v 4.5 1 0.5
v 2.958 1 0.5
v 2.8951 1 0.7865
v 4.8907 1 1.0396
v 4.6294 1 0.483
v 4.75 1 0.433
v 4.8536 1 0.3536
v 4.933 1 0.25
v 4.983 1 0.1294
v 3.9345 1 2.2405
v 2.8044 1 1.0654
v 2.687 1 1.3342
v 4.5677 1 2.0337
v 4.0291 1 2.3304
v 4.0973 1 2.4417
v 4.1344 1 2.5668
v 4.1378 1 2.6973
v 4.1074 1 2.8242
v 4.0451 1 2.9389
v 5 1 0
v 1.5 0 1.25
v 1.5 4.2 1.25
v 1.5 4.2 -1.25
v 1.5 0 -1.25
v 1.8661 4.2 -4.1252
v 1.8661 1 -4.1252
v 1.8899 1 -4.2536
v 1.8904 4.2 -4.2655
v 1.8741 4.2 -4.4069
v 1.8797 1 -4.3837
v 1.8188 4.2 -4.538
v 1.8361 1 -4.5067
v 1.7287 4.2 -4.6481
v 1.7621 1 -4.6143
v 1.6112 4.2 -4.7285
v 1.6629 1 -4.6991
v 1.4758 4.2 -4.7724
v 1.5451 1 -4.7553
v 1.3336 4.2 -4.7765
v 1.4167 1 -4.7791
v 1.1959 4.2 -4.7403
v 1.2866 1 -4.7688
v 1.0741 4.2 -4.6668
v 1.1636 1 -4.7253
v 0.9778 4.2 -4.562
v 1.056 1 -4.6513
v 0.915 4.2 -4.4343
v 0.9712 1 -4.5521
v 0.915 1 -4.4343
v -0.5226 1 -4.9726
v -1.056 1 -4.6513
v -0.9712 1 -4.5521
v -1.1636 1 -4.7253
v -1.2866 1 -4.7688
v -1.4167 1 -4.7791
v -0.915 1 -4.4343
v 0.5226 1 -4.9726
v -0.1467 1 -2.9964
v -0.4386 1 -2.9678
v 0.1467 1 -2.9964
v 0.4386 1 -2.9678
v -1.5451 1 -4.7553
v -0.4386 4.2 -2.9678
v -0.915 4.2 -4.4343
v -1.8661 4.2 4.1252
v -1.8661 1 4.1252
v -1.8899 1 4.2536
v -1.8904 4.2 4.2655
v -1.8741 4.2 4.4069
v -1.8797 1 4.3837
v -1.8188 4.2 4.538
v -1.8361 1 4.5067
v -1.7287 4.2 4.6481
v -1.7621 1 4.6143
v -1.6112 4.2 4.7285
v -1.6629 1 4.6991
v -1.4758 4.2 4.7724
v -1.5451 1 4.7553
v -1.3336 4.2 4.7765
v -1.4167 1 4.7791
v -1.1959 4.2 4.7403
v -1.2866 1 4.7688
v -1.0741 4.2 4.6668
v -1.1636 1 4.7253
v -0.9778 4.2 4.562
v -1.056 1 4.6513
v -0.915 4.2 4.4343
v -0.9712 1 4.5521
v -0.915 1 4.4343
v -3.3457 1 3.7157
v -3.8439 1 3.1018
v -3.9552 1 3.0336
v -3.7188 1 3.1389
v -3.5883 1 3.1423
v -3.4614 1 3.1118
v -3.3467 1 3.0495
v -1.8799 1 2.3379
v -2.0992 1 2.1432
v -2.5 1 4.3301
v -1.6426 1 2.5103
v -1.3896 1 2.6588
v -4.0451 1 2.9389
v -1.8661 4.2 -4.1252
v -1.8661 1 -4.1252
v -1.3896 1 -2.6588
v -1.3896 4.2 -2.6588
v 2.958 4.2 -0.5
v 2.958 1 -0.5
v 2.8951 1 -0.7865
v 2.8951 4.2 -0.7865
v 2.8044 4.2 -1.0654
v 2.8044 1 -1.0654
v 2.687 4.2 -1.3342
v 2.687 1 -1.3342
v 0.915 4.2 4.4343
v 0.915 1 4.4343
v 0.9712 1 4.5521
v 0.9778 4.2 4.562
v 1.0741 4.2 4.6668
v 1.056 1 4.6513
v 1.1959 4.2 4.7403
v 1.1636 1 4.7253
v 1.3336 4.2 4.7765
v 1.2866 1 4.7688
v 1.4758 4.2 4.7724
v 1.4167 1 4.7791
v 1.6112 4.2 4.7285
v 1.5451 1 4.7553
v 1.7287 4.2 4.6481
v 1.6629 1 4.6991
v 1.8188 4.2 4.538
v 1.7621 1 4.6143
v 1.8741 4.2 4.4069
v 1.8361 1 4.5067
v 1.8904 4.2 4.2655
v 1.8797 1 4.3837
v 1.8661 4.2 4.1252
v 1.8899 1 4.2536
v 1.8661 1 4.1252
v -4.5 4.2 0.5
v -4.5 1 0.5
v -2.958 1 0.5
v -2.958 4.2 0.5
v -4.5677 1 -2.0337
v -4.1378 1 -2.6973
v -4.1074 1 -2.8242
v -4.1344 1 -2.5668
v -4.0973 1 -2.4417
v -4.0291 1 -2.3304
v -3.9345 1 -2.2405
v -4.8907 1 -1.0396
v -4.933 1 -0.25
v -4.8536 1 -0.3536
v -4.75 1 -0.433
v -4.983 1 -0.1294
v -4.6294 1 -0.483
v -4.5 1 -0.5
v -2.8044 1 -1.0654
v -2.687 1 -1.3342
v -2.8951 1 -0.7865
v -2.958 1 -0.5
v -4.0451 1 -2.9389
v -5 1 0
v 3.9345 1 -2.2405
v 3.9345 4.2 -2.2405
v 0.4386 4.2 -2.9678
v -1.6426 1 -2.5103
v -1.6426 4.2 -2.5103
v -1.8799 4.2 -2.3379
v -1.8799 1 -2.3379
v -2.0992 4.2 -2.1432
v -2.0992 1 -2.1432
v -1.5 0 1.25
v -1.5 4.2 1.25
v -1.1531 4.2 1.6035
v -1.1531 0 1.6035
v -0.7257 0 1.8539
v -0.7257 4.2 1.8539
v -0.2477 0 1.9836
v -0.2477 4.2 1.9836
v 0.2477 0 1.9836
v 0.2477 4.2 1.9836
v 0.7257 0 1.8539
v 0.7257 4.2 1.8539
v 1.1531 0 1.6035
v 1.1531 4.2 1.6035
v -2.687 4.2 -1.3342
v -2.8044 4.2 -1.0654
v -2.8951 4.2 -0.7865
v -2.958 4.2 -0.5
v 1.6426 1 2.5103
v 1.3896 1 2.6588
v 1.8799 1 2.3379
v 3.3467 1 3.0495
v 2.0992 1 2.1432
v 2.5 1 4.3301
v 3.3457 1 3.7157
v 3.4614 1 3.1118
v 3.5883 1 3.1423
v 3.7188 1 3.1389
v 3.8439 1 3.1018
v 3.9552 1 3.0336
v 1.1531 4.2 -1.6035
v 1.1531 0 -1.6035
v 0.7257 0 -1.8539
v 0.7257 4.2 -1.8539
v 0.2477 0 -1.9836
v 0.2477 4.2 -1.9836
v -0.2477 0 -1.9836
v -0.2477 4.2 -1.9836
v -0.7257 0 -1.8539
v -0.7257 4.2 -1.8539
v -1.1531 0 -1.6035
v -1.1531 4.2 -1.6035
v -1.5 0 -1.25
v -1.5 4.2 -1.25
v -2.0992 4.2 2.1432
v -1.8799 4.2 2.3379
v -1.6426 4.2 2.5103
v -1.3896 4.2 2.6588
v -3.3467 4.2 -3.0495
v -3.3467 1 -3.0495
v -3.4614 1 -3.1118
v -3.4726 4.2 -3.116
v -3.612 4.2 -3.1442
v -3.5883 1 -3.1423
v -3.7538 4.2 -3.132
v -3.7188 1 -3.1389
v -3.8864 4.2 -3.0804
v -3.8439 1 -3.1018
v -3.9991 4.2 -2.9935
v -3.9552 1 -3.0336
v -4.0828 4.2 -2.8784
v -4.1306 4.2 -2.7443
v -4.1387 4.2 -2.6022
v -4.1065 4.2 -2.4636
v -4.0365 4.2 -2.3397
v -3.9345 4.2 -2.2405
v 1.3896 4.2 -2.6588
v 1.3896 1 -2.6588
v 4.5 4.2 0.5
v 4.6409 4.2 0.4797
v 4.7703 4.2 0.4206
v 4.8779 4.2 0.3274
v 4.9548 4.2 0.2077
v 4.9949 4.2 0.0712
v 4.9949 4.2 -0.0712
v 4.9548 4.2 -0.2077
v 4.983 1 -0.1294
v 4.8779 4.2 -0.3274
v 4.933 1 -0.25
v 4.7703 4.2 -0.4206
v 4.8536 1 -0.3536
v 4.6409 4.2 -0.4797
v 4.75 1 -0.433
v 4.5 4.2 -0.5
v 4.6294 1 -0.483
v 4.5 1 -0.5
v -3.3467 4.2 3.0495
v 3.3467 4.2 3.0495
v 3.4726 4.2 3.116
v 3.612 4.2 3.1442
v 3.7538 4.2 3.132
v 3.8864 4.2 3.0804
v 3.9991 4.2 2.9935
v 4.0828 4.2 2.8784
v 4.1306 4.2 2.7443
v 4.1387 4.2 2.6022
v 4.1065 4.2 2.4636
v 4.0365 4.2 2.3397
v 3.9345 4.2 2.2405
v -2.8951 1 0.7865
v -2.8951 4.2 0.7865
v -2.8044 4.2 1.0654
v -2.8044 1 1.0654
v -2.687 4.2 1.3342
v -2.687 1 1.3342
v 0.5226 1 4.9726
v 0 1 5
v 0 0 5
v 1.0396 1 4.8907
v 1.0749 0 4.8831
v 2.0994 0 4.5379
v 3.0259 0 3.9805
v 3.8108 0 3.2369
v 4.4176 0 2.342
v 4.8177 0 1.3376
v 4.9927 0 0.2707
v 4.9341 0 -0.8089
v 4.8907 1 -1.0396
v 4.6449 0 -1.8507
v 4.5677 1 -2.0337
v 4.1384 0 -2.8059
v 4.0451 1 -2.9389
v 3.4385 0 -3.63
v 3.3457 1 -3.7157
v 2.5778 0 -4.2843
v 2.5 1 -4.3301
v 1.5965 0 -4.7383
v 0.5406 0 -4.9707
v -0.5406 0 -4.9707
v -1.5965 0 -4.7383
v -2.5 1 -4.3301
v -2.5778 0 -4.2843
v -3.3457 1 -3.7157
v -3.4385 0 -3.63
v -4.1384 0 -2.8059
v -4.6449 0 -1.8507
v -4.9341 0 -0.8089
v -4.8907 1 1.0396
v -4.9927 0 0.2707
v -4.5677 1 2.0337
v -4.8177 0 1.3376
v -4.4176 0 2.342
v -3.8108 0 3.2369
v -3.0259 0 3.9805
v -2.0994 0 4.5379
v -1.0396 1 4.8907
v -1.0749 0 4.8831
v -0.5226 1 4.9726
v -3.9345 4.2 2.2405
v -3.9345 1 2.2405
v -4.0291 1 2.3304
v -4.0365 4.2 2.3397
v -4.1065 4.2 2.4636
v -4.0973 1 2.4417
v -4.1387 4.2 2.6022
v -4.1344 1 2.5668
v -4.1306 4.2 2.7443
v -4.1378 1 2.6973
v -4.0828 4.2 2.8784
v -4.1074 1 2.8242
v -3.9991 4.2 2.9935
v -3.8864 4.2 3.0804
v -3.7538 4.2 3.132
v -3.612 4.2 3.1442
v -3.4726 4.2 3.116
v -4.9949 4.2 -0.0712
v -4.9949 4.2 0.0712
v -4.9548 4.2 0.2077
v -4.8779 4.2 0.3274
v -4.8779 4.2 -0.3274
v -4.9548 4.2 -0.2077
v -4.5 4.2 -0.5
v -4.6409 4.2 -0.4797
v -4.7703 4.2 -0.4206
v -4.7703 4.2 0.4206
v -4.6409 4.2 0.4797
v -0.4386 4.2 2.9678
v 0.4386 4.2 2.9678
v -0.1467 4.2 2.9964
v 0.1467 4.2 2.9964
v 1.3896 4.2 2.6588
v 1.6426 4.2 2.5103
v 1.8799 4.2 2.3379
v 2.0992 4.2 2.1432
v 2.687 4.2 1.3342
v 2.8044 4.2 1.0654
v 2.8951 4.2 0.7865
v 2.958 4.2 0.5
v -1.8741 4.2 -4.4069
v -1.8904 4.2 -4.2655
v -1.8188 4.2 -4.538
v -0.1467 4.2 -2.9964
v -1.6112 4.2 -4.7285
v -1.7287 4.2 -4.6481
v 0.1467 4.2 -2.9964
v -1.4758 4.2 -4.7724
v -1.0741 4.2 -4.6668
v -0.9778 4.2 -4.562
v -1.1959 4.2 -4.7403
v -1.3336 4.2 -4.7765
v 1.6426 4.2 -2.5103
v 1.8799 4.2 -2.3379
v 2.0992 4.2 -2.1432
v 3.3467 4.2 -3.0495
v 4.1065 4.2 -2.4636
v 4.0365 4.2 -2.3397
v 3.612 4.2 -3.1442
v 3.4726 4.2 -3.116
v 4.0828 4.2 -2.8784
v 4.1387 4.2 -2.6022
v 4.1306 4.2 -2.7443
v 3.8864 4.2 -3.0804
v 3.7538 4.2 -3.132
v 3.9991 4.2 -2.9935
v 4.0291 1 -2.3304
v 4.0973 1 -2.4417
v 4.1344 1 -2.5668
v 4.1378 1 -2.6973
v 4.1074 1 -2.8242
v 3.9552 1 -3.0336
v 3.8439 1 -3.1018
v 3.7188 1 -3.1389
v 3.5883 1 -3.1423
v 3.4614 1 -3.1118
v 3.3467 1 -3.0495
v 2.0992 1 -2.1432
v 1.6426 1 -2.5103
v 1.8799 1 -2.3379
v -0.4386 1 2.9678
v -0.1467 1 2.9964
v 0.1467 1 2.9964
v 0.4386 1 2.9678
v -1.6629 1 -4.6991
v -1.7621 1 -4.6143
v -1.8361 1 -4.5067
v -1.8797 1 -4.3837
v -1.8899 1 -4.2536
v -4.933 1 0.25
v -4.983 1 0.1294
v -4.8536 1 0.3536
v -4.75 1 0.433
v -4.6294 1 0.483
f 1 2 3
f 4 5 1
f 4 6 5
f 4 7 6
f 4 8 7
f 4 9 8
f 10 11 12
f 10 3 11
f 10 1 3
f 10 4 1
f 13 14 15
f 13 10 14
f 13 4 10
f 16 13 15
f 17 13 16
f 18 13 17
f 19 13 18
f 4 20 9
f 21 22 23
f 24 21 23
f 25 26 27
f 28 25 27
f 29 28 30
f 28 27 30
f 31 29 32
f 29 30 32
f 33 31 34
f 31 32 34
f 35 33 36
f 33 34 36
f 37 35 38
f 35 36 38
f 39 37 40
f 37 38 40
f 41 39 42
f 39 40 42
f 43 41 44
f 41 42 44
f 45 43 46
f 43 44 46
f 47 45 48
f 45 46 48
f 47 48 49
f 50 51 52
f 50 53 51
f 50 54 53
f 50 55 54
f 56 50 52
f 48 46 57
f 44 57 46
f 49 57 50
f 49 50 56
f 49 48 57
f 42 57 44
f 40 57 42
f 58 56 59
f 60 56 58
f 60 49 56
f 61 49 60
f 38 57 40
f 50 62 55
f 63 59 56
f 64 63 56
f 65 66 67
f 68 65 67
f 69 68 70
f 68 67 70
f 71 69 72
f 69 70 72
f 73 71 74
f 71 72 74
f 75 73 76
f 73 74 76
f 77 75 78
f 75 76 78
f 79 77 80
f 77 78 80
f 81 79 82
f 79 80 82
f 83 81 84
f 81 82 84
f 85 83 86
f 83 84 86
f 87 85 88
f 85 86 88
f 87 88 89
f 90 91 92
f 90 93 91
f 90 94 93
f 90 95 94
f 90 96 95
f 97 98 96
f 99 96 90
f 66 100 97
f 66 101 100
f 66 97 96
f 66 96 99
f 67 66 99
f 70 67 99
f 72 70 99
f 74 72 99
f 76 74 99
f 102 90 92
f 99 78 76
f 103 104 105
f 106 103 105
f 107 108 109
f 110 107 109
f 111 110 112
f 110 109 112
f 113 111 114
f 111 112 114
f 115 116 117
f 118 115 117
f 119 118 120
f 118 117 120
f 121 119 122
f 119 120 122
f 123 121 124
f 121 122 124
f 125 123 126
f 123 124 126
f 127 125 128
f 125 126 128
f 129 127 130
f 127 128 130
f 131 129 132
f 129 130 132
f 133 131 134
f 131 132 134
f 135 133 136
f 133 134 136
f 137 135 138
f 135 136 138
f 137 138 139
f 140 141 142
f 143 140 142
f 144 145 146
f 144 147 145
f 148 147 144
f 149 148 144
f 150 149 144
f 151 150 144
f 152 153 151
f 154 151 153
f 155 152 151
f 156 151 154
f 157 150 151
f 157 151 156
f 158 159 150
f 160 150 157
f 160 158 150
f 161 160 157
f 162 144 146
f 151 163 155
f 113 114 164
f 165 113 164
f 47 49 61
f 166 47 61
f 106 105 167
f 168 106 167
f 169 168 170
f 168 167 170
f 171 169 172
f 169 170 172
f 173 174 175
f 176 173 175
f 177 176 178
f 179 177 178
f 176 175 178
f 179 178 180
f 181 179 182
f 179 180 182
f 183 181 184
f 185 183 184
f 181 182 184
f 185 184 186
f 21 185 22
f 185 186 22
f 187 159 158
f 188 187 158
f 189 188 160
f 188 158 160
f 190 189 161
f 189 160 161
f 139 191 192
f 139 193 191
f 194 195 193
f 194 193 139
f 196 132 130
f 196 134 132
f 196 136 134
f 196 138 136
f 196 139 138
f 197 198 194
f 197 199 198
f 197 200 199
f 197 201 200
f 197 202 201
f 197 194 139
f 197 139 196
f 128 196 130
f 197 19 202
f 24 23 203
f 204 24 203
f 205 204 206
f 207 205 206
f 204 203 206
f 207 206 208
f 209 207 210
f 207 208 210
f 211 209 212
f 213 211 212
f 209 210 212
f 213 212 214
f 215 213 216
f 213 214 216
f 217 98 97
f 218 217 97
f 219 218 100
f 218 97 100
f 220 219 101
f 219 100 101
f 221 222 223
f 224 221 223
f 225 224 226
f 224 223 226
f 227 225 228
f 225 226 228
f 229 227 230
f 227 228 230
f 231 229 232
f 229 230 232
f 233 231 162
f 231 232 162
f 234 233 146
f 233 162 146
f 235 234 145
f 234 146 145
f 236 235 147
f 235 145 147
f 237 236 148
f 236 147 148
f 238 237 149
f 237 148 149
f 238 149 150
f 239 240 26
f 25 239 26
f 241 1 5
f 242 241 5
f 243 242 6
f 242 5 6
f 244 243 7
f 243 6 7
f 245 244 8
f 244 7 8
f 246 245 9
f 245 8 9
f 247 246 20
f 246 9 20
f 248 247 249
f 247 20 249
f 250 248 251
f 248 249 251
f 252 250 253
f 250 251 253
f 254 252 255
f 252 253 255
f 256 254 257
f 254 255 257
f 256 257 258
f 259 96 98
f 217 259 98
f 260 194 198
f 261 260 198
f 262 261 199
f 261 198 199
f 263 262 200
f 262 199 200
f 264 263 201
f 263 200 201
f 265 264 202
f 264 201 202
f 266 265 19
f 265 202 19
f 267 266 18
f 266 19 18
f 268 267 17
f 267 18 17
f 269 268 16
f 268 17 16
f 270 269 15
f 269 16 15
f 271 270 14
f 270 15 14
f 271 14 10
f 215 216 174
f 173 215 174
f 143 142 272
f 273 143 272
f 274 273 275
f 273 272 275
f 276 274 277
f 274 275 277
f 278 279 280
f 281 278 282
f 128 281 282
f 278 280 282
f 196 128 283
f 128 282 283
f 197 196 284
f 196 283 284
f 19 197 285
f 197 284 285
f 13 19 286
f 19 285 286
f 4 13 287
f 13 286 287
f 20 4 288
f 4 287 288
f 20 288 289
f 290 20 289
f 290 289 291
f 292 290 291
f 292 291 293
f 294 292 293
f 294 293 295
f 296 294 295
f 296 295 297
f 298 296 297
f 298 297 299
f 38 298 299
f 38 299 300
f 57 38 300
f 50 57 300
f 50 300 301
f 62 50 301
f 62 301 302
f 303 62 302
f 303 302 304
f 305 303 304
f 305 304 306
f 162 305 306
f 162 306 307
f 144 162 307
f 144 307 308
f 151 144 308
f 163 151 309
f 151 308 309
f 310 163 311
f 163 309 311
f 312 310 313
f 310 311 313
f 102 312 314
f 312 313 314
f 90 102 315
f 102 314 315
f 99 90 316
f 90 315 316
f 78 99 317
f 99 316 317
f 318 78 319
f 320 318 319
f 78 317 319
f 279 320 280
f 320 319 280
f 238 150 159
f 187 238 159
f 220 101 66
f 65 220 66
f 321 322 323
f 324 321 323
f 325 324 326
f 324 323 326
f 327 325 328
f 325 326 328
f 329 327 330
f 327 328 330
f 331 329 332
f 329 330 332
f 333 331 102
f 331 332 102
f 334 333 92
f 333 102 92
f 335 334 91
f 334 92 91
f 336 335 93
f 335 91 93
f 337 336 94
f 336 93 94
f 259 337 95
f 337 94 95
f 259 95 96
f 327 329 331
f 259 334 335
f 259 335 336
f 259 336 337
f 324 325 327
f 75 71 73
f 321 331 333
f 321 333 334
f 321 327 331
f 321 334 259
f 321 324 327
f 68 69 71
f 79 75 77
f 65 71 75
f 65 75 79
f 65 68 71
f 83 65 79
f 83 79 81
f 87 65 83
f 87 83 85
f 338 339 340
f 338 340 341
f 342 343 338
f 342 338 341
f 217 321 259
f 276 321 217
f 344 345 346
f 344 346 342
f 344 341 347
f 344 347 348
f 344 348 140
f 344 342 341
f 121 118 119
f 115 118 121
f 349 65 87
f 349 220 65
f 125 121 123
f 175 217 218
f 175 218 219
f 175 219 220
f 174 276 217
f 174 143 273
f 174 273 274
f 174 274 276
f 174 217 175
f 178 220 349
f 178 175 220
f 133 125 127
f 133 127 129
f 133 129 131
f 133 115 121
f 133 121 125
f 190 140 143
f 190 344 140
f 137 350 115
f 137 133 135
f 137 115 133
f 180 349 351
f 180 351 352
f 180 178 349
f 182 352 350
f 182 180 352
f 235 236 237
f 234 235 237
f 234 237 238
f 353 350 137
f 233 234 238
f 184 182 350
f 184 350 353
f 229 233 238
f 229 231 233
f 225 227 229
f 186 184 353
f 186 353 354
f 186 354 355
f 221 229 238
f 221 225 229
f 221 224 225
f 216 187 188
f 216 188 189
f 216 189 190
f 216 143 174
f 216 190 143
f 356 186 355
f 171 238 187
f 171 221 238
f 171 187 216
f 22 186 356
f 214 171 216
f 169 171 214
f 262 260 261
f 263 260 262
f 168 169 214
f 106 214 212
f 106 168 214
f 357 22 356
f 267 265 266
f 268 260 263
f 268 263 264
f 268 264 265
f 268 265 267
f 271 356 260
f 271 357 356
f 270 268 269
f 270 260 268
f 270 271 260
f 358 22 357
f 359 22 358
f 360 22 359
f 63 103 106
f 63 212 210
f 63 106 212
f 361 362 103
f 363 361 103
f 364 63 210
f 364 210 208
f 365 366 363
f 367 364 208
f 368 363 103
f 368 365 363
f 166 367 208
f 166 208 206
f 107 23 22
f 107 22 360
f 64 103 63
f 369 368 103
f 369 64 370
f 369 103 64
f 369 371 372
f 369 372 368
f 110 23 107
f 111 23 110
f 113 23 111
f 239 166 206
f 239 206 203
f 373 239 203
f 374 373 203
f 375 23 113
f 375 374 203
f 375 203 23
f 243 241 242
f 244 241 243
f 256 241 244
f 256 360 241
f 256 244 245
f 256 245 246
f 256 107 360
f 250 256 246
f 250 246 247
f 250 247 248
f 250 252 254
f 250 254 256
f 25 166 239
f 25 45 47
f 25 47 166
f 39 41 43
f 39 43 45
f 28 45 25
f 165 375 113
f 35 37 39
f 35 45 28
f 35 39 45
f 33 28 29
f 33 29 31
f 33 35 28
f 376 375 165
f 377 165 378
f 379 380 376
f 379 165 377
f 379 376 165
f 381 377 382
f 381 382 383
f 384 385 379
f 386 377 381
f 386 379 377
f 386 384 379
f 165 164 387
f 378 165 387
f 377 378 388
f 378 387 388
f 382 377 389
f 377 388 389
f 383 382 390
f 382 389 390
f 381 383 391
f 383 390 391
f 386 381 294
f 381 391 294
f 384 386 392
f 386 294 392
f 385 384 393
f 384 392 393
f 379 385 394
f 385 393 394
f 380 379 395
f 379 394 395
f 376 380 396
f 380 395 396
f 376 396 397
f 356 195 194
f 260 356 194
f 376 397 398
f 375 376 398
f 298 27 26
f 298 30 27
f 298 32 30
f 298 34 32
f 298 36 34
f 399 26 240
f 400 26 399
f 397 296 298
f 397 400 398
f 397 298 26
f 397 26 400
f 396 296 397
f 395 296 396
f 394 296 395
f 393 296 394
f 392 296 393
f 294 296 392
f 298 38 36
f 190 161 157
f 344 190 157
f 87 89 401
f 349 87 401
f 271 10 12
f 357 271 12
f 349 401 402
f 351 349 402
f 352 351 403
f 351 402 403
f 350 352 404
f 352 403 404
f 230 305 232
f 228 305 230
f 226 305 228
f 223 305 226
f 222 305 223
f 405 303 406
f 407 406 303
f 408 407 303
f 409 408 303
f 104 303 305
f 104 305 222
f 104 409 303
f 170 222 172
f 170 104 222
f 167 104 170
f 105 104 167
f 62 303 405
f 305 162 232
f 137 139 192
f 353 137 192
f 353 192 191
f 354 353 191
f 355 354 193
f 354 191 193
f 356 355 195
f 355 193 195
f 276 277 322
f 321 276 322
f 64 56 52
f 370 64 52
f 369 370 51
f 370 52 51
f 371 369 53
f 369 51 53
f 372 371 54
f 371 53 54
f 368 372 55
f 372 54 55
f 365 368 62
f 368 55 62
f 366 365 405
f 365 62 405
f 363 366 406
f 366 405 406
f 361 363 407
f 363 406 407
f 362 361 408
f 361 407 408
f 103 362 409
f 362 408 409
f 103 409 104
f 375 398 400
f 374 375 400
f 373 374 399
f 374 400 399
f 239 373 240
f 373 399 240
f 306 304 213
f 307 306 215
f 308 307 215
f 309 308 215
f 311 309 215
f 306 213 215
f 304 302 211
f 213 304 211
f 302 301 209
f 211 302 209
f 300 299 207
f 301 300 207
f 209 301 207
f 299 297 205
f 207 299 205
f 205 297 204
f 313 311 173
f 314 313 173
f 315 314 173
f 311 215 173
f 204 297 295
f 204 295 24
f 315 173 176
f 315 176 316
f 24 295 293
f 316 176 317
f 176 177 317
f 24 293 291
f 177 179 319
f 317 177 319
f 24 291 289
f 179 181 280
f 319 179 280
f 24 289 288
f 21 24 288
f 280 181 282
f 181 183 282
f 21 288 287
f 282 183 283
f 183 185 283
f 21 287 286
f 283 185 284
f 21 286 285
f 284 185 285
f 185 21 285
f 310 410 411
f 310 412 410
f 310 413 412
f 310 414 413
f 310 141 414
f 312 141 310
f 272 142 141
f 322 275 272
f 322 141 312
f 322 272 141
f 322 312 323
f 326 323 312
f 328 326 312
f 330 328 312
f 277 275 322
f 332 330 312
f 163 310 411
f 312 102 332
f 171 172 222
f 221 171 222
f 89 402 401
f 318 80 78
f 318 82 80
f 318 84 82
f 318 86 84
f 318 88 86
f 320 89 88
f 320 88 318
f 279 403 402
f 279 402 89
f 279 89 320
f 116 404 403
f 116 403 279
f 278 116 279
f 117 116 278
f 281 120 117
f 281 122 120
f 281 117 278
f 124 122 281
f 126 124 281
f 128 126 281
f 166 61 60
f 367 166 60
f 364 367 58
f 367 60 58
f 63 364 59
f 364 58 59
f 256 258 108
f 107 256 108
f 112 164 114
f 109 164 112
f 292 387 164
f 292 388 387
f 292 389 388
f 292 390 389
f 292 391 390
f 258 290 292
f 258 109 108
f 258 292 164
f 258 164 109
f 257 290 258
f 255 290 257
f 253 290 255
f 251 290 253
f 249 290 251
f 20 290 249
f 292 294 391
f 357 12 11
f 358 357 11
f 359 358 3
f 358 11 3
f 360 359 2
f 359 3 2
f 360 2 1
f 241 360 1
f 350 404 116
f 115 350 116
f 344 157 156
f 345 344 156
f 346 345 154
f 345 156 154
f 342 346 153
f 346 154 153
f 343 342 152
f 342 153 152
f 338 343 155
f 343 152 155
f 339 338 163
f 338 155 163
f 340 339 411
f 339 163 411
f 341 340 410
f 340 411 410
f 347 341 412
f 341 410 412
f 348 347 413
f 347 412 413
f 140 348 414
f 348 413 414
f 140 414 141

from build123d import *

# Parameters (mm, degrees)
SKETCH1_R           = 5
BOSS_EXTRUDE1_DEPTH = 4.2
CUT_EXTRUDE2_DEPTH  = 9.224354078
CUT_EXTRUDE4_START  = -3.2
SKETCH6_R           = 5
SKETCH6_R_2         = 3
CUT_EXTRUDE4_DEPTH  = 3.2
BOSS_EXTRUDE3_DEPTH = 3.2


with BuildPart() as part:
    # Sketch1 → Boss-Extrude1 (new body)
    with BuildSketch(Plane(origin=(0, 0, 0), x_dir=(1, 0, 0), z_dir=(0, 1, 0))):
        with Locations(Location((0, 0, 0), (0, 0, 270))):
            Circle(SKETCH1_R)
    extrude(amount=BOSS_EXTRUDE1_DEPTH)

    # Sketch2 → Cut-Extrude2 (cut, through all)
    with BuildSketch(Plane(origin=(0, 4.2, 0), x_dir=(1, 0, 0), z_dir=(0, 1, 0))):
        with BuildLine():
            Line((-1.5, 1.25), (-1.5, -1.25))
            ThreePointArc((-1.5, -1.25), (0, -2), (1.5, -1.25))
            Line((1.5, -1.25), (1.5, 1.25))
            ThreePointArc((1.5, 1.25), (0, 2), (-1.5, 1.25))
        make_face()
    extrude(amount=-CUT_EXTRUDE2_DEPTH, mode=Mode.SUBTRACT)

    # Sketch6 → Cut-Extrude4 (cut)
    with BuildSketch(Plane(origin=(0, 4.2, 0), x_dir=(1, 0, 0), z_dir=(0, 1, 0)).offset(CUT_EXTRUDE4_START)):
        with Locations(Location((0, 0, 0), (0, 0, 270))):
            Circle(SKETCH6_R)
        with Locations(Location((0, 0, 0), (0, 0, 270))):
            Circle(SKETCH6_R_2, mode=Mode.SUBTRACT)
    extrude(amount=CUT_EXTRUDE4_DEPTH, mode=Mode.SUBTRACT)

    # Sketch7 → Boss-Extrude3 (add)
    with BuildSketch(Plane(origin=(0, 1, 0), x_dir=(1, 0, 0), z_dir=(0, 1, 0))):
        with BuildLine():
            Line((-3.934469101, 2.240525138), (-2.686997168, 1.334183727))
            ThreePointArc((-2.686997168, 1.334183727), (-2.427050983, 1.763355757), (-2.099211916, 2.143200721))
            Line((-2.099211916, 2.143200721), (-3.346683849, 3.049542133))
            ThreePointArc((-3.346683849, 3.049542133), (-4.045084972, 2.938926261), (-3.934469101, 2.240525138))
        make_face()
        with BuildLine():
            ThreePointArc((-1.389612855, 2.658754617), (-0.927050983, 2.853169549), (-0.438556338, 2.967771612))
            Line((-0.438556338, 2.967771612), (-0.915048217, 4.434262821))
            ThreePointArc((-0.915048217, 4.434262821), (-1.545084972, 4.755282581), (-1.866104733, 4.125245826))
            Line((-1.866104733, 4.125245826), (-1.389612855, 2.658754617))
        make_face()
        with BuildLine():
            ThreePointArc((0.438556338, 2.967771612), (0.927050983, 2.853169549), (1.389612855, 2.658754617))
            Line((1.389612855, 2.658754617), (1.866104733, 4.125245826))
            ThreePointArc((1.866104733, 4.125245826), (1.545084972, 4.755282581), (0.915048217, 4.434262821))
            Line((0.915048217, 4.434262821), (0.438556338, 2.967771612))
        make_face()
        with BuildLine():
            ThreePointArc((2.099211916, 2.143200721), (2.427050983, 1.763355757), (2.686997168, 1.334183727))
            Line((2.686997168, 1.334183727), (3.934469101, 2.240525138))
            ThreePointArc((3.934469101, 2.240525138), (4.045084972, 2.938926261), (3.346683849, 3.049542133))
            Line((3.346683849, 3.049542133), (2.099211916, 2.143200721))
        make_face()
        with BuildLine():
            ThreePointArc((3, 0), (2.989491568, -0.250878781), (2.958039892, -0.5))
            Line((2.958039892, -0.5), (4.5, -0.5))
            ThreePointArc((4.5, -0.5), (5, 0), (4.5, 0.5))
            Line((4.5, 0.5), (2.958039892, 0.5))
            ThreePointArc((2.958039892, 0.5), (2.989491568, 0.250878781), (3, 0))
        make_face()
        with BuildLine():
            ThreePointArc((3.346683849, -3.049542133), (4.045084972, -2.938926261), (3.934469101, -2.240525138))
            Line((3.934469101, -2.240525138), (2.686997168, -1.334183727))
            ThreePointArc((2.686997168, -1.334183727), (2.427050983, -1.763355757), (2.099211916, -2.143200721))
            Line((2.099211916, -2.143200721), (3.346683849, -3.049542133))
        make_face()
        with BuildLine():
            Line((1.866104733, -4.125245826), (1.389612855, -2.658754617))
            ThreePointArc((1.389612855, -2.658754617), (0.927050983, -2.853169549), (0.438556338, -2.967771612))
            Line((0.438556338, -2.967771612), (0.915048217, -4.434262821))
            ThreePointArc((0.915048217, -4.434262821), (1.545084972, -4.755282581), (1.866104733, -4.125245826))
        make_face()
        with BuildLine():
            Line((-0.915048217, -4.434262821), (-0.438556338, -2.967771612))
            ThreePointArc((-0.438556338, -2.967771612), (-0.927050983, -2.853169549), (-1.389612855, -2.658754617))
            Line((-1.389612855, -2.658754617), (-1.866104733, -4.125245826))
            ThreePointArc((-1.866104733, -4.125245826), (-1.545084972, -4.755282581), (-0.915048217, -4.434262821))
        make_face()
        with BuildLine():
            Line((-3.346683849, -3.049542133), (-2.099211916, -2.143200721))
            ThreePointArc((-2.099211916, -2.143200721), (-2.427050983, -1.763355757), (-2.686997168, -1.334183727))
            Line((-2.686997168, -1.334183727), (-3.934469101, -2.240525138))
            ThreePointArc((-3.934469101, -2.240525138), (-4.045084972, -2.938926261), (-3.346683849, -3.049542133))
        make_face()
        with BuildLine():
            Line((-4.5, -0.5), (-2.958039892, -0.5))
            ThreePointArc((-2.958039892, -0.5), (-3, 0), (-2.958039892, 0.5))
            Line((-2.958039892, 0.5), (-4.5, 0.5))
            ThreePointArc((-4.5, 0.5), (-5, 0), (-4.5, -0.5))
        make_face()
    extrude(amount=BOSS_EXTRUDE3_DEPTH)


solid = part.part
